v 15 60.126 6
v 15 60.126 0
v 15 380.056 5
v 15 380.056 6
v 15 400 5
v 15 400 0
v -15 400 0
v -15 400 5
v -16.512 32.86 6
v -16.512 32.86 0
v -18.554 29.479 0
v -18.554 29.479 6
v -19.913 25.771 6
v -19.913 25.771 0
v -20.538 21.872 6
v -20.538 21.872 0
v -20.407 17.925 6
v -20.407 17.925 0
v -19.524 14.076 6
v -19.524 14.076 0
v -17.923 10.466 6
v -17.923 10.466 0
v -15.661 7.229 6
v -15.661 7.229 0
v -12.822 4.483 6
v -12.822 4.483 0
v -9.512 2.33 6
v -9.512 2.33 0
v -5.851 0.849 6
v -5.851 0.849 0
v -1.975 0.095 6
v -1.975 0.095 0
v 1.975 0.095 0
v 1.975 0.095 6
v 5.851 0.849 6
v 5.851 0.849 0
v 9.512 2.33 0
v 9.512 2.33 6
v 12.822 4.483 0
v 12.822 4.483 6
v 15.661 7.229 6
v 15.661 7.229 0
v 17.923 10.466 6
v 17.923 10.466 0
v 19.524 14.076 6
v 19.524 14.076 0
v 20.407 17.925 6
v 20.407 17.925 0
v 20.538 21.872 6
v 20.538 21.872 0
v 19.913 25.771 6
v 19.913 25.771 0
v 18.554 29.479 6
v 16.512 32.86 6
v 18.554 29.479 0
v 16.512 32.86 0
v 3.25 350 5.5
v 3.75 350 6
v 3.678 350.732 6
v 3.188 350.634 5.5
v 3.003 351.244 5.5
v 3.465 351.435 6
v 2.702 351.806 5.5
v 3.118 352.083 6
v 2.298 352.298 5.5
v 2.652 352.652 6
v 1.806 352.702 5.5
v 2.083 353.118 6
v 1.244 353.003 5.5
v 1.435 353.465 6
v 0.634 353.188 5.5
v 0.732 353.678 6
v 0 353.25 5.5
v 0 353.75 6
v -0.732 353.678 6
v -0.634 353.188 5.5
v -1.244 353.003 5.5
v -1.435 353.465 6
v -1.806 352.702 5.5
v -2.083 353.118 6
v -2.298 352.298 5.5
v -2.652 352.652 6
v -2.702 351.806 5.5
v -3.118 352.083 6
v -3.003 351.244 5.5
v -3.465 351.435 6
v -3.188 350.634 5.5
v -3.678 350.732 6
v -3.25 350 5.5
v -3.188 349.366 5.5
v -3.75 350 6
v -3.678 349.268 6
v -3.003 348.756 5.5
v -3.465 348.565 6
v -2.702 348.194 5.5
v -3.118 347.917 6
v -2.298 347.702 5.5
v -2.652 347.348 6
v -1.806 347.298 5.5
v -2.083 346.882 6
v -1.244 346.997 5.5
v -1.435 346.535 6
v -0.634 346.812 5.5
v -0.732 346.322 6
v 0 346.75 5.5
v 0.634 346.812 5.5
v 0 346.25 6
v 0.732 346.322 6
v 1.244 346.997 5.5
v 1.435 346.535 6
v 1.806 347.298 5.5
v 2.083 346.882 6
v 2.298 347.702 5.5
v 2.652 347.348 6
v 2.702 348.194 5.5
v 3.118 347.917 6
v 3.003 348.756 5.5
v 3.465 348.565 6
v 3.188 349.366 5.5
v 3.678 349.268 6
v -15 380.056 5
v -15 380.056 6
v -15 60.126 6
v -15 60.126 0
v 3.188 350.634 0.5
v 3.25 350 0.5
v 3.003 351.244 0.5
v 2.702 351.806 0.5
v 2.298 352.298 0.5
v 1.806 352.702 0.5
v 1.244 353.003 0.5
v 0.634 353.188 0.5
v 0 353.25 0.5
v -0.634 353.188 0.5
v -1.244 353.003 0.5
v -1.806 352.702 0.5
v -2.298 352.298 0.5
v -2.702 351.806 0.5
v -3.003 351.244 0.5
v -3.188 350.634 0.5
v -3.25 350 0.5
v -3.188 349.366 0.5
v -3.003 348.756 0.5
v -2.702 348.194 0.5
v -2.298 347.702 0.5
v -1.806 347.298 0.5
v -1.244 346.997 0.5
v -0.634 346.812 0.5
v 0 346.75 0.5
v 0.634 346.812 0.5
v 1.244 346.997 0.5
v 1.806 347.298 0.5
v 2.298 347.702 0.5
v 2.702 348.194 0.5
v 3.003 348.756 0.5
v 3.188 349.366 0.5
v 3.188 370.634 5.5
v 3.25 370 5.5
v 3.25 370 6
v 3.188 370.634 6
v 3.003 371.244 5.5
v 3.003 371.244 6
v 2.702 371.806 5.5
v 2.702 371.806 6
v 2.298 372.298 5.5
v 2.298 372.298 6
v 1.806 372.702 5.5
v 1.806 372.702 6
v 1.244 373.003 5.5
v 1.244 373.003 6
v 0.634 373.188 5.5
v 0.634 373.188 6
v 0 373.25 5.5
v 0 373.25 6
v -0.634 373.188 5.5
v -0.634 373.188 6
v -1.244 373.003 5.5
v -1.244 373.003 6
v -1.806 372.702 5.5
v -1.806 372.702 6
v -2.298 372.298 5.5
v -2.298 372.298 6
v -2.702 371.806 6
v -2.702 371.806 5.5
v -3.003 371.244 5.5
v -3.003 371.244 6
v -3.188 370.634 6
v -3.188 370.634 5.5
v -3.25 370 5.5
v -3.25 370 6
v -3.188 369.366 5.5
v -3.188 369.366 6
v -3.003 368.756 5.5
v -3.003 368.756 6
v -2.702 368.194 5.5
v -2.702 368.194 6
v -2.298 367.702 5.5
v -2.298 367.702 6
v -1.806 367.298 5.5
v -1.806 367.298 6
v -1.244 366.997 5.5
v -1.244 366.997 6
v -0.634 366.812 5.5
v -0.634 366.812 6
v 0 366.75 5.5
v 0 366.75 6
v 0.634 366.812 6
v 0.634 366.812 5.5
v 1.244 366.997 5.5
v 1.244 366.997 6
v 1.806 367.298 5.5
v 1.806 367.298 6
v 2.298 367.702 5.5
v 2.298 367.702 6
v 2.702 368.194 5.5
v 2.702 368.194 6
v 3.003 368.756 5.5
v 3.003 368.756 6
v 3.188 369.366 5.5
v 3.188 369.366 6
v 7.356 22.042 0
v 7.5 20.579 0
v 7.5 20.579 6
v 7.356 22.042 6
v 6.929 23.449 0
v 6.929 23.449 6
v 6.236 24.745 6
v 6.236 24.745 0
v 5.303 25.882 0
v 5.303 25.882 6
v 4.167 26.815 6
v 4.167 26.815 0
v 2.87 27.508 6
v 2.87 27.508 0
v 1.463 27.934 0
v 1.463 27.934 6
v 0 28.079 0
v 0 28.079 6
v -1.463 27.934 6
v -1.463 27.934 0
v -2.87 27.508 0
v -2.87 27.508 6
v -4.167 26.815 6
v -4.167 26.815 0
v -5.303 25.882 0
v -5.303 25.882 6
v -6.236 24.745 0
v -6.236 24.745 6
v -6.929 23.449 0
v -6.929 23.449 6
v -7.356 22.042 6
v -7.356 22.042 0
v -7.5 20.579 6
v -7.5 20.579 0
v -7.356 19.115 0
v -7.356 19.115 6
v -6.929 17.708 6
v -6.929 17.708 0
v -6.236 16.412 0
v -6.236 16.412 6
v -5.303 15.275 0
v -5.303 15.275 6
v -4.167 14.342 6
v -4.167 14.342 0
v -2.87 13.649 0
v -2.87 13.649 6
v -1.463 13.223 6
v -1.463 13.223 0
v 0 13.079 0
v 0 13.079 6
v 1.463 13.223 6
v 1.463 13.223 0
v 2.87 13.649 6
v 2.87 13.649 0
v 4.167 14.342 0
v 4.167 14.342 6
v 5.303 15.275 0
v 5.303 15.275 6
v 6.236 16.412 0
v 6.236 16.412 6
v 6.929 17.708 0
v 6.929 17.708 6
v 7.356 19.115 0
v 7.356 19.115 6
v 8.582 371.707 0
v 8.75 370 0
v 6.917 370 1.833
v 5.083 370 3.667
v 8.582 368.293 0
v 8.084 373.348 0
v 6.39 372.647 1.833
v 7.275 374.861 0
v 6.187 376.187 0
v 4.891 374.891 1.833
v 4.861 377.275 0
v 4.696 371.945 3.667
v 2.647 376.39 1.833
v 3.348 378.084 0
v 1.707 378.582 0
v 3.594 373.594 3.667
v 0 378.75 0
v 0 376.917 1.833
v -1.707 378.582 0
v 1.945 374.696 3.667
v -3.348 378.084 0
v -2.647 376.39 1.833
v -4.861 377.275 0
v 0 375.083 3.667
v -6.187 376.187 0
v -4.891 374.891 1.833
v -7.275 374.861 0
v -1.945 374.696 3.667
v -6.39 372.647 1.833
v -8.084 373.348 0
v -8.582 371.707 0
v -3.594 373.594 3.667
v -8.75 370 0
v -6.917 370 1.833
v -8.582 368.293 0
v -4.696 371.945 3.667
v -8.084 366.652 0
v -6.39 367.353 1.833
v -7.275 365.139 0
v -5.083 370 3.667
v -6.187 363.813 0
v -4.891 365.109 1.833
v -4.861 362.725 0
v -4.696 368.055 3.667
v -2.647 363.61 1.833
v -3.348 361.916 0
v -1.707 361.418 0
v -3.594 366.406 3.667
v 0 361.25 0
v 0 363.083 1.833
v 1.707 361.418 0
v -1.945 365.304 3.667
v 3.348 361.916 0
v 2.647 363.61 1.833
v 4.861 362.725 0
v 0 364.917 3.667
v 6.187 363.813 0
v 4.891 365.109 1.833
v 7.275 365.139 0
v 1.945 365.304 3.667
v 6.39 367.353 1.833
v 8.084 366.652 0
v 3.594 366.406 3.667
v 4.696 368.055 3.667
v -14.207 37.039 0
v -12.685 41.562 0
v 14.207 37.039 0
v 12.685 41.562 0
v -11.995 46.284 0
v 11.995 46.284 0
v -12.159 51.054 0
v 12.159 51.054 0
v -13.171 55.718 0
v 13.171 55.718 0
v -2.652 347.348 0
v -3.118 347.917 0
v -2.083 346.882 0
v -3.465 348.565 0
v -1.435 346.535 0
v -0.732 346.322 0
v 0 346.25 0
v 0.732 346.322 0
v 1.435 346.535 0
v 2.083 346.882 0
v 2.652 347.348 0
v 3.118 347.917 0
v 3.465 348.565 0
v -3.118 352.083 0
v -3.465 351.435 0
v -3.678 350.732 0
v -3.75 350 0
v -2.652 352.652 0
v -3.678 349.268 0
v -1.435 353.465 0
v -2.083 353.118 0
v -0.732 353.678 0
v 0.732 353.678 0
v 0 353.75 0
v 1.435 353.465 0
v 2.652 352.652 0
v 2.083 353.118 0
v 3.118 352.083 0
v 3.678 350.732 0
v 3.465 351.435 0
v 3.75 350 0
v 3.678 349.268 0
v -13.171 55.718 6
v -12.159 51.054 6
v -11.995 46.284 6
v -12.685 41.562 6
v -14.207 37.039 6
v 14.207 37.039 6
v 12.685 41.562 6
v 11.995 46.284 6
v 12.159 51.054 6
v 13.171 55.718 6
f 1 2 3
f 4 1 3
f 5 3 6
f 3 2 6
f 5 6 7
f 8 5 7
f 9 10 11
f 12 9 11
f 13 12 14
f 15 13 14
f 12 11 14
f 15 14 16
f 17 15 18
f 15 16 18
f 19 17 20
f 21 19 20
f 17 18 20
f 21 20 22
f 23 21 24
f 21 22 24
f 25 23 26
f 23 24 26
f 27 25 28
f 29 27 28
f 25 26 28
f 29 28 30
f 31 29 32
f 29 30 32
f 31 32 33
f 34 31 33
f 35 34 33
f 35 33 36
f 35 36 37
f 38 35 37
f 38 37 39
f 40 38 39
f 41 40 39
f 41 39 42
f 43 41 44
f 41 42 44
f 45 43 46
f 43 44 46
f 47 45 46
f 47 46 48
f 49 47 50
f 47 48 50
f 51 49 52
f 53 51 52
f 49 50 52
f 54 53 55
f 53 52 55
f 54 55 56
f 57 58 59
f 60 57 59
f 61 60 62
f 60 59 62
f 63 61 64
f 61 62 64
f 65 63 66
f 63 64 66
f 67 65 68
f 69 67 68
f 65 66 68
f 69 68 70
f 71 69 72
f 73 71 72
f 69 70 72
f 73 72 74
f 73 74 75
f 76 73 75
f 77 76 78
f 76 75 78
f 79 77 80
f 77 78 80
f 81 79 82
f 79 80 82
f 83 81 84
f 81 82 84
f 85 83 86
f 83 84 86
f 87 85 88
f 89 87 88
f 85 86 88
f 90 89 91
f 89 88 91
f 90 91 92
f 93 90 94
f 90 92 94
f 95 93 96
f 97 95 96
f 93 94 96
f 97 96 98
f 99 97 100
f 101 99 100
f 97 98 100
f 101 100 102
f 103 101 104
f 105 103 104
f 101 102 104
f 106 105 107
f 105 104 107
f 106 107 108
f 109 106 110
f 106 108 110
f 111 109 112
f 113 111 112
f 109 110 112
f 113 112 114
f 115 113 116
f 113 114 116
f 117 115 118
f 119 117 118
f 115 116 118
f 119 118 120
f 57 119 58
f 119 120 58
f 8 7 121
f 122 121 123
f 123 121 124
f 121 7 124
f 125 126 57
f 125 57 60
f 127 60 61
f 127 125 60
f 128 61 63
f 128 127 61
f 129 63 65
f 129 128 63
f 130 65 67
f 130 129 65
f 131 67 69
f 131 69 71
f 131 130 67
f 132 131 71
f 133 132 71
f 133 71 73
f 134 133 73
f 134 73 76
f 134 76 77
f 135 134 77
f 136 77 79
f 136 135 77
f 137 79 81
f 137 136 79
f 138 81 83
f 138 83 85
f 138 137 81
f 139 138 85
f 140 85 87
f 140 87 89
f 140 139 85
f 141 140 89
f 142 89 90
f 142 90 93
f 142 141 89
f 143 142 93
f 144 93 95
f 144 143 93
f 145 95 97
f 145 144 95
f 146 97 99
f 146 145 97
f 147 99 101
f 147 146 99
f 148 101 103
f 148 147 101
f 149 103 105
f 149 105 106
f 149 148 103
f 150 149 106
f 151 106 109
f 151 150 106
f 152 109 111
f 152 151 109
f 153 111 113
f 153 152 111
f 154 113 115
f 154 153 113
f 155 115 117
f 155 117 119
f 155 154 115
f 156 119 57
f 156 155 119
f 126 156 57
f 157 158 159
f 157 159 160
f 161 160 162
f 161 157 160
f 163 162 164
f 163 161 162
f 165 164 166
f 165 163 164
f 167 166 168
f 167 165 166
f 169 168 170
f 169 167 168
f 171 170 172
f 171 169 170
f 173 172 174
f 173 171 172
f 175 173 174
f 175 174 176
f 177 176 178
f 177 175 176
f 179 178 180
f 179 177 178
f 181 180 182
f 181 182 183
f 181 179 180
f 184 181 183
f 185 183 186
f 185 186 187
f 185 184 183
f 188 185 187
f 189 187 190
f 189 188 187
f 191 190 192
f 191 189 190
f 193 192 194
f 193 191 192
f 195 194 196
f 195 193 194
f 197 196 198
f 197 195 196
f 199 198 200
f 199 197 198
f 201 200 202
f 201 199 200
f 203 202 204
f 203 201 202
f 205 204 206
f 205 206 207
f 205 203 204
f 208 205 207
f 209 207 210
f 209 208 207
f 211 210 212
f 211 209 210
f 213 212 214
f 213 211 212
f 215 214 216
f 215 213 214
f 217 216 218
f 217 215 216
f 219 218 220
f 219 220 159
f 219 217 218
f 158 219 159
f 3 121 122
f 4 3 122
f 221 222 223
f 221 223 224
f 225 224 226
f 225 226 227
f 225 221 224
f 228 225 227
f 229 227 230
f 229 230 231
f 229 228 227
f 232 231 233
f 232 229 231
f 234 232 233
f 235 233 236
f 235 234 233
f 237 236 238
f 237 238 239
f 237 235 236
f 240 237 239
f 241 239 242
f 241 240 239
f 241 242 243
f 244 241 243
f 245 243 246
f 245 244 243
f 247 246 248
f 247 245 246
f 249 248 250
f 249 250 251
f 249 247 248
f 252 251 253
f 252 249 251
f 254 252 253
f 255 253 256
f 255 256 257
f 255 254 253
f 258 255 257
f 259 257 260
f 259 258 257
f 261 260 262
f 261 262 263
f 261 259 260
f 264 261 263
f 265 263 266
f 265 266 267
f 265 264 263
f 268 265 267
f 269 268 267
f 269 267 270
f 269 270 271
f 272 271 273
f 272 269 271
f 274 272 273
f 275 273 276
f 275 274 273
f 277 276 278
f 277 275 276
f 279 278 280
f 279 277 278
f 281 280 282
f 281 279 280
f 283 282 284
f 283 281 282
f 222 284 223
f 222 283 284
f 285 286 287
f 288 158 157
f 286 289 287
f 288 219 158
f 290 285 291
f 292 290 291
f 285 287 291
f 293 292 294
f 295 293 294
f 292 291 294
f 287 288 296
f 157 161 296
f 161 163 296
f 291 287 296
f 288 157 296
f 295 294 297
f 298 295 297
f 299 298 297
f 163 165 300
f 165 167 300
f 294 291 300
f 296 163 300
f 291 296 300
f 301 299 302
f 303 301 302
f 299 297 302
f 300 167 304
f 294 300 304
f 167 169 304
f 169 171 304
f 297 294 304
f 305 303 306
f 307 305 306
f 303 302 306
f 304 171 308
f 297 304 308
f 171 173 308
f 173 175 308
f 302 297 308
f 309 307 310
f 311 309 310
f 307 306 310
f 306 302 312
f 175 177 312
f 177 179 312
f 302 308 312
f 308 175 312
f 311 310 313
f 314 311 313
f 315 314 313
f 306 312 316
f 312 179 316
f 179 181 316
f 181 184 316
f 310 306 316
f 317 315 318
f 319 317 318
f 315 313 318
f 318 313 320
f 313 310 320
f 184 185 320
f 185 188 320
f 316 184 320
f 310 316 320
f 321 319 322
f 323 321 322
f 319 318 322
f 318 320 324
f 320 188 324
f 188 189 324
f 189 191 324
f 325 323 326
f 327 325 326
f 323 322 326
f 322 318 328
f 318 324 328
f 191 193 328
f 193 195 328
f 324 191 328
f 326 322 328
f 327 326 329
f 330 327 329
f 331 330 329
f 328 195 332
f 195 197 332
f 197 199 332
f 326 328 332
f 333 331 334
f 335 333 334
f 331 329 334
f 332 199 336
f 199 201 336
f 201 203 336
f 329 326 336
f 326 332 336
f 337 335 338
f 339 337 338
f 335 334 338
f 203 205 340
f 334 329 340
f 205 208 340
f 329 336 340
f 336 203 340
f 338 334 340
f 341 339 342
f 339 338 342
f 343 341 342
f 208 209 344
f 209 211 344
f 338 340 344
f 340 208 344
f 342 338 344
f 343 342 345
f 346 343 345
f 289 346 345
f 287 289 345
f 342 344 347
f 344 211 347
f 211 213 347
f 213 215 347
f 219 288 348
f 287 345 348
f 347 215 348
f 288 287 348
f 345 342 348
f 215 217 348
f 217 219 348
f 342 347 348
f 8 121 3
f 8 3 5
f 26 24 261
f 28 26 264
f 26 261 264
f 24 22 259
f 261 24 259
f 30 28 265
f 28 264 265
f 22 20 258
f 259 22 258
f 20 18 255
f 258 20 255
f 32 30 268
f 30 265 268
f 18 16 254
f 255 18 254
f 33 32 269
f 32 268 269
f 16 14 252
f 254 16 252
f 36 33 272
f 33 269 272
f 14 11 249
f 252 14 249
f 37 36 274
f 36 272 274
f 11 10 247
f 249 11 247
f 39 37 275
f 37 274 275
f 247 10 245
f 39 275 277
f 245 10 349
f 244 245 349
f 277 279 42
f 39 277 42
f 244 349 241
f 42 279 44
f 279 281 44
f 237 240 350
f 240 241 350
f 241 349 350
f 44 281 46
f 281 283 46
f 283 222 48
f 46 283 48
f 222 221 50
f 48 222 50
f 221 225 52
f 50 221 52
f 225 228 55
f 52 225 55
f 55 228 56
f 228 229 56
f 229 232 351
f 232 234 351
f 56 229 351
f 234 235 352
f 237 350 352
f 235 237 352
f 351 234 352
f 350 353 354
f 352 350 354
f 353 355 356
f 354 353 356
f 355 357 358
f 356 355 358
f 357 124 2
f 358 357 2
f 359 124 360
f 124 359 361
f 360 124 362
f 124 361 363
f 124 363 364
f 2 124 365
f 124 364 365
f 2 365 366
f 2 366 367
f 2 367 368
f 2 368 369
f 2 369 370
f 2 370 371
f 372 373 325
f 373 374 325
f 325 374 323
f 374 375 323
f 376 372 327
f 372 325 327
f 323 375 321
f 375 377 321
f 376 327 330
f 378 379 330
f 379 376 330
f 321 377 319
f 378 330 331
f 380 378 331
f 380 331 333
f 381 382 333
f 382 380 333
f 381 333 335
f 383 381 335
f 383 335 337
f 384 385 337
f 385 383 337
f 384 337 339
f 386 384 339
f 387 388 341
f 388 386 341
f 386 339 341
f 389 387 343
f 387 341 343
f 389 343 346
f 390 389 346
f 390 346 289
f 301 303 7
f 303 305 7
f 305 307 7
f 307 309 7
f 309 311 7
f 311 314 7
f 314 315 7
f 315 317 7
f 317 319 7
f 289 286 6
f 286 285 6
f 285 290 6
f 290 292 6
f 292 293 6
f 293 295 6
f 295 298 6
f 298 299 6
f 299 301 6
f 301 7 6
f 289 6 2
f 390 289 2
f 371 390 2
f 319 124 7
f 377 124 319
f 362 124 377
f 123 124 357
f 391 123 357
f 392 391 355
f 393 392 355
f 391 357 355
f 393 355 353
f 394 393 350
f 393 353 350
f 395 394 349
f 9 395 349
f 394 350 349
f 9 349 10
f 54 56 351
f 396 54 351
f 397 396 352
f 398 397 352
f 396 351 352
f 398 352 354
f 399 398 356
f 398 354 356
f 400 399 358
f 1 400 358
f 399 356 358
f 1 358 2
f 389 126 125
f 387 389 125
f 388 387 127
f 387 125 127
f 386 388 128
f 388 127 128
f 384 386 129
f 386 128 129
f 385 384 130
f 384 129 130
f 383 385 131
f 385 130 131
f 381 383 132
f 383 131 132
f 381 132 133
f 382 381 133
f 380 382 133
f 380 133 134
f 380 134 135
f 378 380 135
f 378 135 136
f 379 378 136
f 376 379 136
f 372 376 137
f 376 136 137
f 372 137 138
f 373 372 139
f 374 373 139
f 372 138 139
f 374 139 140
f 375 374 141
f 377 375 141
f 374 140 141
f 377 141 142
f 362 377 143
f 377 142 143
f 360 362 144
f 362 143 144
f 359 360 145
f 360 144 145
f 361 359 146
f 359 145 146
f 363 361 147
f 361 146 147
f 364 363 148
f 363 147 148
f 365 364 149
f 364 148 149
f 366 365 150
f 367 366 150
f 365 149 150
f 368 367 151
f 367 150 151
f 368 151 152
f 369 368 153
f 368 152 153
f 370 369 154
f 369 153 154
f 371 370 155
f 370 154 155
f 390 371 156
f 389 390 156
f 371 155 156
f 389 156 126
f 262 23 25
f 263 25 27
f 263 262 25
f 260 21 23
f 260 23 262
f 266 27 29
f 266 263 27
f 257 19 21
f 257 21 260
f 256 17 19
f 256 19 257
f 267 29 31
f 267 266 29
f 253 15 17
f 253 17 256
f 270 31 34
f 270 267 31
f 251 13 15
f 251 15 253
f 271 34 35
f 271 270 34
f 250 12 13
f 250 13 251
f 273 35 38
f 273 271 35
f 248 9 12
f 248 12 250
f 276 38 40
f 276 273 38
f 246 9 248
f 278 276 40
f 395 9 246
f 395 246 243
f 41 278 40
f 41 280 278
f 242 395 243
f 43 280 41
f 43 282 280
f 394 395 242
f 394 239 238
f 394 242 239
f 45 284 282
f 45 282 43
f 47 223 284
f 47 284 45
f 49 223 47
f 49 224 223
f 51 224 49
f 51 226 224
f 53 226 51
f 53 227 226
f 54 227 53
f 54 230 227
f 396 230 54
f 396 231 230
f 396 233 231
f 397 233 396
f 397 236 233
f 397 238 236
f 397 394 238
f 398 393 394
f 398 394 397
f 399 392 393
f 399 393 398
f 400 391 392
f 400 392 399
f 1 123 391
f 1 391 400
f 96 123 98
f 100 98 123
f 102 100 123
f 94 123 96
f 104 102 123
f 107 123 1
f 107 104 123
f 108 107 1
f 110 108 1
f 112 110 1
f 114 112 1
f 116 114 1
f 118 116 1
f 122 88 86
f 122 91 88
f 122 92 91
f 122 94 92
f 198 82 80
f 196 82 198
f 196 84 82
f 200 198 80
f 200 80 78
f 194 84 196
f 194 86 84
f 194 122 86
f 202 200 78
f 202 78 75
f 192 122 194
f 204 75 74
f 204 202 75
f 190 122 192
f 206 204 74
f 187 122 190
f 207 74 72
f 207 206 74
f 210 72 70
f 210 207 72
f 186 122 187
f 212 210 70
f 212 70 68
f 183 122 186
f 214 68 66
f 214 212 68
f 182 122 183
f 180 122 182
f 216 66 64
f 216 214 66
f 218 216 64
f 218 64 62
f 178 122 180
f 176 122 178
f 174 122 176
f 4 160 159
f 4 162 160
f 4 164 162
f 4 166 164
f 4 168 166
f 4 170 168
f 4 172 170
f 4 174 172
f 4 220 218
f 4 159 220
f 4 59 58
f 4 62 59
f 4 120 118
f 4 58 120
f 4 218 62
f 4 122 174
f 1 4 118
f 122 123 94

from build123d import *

# Parameters (mm, degrees)
SKETCH_1_R          = 3.25
SKETCH_1_R_2        = 7.5
EXTRUDE_1_DEPTH     = 6
SKETCH_2_W          = 1
SKETCH_2_H          = 19.943647813
CUT_EXTRUDE_1_DEPTH = 36.578503871
CHAMFER_1_SIZE      = 5.5
CHAMFER_2_SIZE      = 0.5


with BuildPart() as part:
    # Эскиз1 → Бобышка-Вытянуть1 (new body)
    with BuildSketch(Plane.XY):
        with BuildLine():
            Line((15, 60.126164395), (15, 400))
            Line((15, 400), (-15, 400))
            Line((-15, 400), (-15, 60.126164395))
            ThreePointArc((-15, 60.126164395), (-11.99467632, 46.284317121), (-16.512069377, 32.859643332))
            ThreePointArc((-16.512069377, 32.859643332), (0, 0), (16.512069377, 32.859643332))
            ThreePointArc((16.512069377, 32.859643332), (11.99467632, 46.284317121), (15, 60.126164395))
        make_face()
        with Locations((0, 370)):
            Circle(SKETCH_1_R, mode=Mode.SUBTRACT)
        with Locations((0, 350)):
            Circle(SKETCH_1_R, mode=Mode.SUBTRACT)
        with Locations((0, 20.578503871)):
            Circle(SKETCH_1_R_2, mode=Mode.SUBTRACT)
    extrude(amount=EXTRUDE_1_DEPTH)

    # Эскиз2 → Вырез-Вытянуть1 (cut, through all)
    with BuildSketch(Plane.ZY.offset(15)):
        with Locations((5.5, 390.028176094)):
            Rectangle(SKETCH_2_W, SKETCH_2_H)
    extrude(amount=-CUT_EXTRUDE_1_DEPTH, mode=Mode.SUBTRACT)

    # Фаска1
    chamfer_1_edges = [part.edges().sort_by_distance(p)[0] for p in [
        (-3.25, 370, 0),
    ]]
    chamfer(chamfer_1_edges, length=CHAMFER_1_SIZE)

    # Фаска2
    chamfer_2_edges = [part.edges().sort_by_distance(p)[0] for p in [
        (-3.25, 350, 0),
        (-3.25, 350, 6),
    ]]
    chamfer(chamfer_2_edges, length=CHAMFER_2_SIZE)


solid = part.part
